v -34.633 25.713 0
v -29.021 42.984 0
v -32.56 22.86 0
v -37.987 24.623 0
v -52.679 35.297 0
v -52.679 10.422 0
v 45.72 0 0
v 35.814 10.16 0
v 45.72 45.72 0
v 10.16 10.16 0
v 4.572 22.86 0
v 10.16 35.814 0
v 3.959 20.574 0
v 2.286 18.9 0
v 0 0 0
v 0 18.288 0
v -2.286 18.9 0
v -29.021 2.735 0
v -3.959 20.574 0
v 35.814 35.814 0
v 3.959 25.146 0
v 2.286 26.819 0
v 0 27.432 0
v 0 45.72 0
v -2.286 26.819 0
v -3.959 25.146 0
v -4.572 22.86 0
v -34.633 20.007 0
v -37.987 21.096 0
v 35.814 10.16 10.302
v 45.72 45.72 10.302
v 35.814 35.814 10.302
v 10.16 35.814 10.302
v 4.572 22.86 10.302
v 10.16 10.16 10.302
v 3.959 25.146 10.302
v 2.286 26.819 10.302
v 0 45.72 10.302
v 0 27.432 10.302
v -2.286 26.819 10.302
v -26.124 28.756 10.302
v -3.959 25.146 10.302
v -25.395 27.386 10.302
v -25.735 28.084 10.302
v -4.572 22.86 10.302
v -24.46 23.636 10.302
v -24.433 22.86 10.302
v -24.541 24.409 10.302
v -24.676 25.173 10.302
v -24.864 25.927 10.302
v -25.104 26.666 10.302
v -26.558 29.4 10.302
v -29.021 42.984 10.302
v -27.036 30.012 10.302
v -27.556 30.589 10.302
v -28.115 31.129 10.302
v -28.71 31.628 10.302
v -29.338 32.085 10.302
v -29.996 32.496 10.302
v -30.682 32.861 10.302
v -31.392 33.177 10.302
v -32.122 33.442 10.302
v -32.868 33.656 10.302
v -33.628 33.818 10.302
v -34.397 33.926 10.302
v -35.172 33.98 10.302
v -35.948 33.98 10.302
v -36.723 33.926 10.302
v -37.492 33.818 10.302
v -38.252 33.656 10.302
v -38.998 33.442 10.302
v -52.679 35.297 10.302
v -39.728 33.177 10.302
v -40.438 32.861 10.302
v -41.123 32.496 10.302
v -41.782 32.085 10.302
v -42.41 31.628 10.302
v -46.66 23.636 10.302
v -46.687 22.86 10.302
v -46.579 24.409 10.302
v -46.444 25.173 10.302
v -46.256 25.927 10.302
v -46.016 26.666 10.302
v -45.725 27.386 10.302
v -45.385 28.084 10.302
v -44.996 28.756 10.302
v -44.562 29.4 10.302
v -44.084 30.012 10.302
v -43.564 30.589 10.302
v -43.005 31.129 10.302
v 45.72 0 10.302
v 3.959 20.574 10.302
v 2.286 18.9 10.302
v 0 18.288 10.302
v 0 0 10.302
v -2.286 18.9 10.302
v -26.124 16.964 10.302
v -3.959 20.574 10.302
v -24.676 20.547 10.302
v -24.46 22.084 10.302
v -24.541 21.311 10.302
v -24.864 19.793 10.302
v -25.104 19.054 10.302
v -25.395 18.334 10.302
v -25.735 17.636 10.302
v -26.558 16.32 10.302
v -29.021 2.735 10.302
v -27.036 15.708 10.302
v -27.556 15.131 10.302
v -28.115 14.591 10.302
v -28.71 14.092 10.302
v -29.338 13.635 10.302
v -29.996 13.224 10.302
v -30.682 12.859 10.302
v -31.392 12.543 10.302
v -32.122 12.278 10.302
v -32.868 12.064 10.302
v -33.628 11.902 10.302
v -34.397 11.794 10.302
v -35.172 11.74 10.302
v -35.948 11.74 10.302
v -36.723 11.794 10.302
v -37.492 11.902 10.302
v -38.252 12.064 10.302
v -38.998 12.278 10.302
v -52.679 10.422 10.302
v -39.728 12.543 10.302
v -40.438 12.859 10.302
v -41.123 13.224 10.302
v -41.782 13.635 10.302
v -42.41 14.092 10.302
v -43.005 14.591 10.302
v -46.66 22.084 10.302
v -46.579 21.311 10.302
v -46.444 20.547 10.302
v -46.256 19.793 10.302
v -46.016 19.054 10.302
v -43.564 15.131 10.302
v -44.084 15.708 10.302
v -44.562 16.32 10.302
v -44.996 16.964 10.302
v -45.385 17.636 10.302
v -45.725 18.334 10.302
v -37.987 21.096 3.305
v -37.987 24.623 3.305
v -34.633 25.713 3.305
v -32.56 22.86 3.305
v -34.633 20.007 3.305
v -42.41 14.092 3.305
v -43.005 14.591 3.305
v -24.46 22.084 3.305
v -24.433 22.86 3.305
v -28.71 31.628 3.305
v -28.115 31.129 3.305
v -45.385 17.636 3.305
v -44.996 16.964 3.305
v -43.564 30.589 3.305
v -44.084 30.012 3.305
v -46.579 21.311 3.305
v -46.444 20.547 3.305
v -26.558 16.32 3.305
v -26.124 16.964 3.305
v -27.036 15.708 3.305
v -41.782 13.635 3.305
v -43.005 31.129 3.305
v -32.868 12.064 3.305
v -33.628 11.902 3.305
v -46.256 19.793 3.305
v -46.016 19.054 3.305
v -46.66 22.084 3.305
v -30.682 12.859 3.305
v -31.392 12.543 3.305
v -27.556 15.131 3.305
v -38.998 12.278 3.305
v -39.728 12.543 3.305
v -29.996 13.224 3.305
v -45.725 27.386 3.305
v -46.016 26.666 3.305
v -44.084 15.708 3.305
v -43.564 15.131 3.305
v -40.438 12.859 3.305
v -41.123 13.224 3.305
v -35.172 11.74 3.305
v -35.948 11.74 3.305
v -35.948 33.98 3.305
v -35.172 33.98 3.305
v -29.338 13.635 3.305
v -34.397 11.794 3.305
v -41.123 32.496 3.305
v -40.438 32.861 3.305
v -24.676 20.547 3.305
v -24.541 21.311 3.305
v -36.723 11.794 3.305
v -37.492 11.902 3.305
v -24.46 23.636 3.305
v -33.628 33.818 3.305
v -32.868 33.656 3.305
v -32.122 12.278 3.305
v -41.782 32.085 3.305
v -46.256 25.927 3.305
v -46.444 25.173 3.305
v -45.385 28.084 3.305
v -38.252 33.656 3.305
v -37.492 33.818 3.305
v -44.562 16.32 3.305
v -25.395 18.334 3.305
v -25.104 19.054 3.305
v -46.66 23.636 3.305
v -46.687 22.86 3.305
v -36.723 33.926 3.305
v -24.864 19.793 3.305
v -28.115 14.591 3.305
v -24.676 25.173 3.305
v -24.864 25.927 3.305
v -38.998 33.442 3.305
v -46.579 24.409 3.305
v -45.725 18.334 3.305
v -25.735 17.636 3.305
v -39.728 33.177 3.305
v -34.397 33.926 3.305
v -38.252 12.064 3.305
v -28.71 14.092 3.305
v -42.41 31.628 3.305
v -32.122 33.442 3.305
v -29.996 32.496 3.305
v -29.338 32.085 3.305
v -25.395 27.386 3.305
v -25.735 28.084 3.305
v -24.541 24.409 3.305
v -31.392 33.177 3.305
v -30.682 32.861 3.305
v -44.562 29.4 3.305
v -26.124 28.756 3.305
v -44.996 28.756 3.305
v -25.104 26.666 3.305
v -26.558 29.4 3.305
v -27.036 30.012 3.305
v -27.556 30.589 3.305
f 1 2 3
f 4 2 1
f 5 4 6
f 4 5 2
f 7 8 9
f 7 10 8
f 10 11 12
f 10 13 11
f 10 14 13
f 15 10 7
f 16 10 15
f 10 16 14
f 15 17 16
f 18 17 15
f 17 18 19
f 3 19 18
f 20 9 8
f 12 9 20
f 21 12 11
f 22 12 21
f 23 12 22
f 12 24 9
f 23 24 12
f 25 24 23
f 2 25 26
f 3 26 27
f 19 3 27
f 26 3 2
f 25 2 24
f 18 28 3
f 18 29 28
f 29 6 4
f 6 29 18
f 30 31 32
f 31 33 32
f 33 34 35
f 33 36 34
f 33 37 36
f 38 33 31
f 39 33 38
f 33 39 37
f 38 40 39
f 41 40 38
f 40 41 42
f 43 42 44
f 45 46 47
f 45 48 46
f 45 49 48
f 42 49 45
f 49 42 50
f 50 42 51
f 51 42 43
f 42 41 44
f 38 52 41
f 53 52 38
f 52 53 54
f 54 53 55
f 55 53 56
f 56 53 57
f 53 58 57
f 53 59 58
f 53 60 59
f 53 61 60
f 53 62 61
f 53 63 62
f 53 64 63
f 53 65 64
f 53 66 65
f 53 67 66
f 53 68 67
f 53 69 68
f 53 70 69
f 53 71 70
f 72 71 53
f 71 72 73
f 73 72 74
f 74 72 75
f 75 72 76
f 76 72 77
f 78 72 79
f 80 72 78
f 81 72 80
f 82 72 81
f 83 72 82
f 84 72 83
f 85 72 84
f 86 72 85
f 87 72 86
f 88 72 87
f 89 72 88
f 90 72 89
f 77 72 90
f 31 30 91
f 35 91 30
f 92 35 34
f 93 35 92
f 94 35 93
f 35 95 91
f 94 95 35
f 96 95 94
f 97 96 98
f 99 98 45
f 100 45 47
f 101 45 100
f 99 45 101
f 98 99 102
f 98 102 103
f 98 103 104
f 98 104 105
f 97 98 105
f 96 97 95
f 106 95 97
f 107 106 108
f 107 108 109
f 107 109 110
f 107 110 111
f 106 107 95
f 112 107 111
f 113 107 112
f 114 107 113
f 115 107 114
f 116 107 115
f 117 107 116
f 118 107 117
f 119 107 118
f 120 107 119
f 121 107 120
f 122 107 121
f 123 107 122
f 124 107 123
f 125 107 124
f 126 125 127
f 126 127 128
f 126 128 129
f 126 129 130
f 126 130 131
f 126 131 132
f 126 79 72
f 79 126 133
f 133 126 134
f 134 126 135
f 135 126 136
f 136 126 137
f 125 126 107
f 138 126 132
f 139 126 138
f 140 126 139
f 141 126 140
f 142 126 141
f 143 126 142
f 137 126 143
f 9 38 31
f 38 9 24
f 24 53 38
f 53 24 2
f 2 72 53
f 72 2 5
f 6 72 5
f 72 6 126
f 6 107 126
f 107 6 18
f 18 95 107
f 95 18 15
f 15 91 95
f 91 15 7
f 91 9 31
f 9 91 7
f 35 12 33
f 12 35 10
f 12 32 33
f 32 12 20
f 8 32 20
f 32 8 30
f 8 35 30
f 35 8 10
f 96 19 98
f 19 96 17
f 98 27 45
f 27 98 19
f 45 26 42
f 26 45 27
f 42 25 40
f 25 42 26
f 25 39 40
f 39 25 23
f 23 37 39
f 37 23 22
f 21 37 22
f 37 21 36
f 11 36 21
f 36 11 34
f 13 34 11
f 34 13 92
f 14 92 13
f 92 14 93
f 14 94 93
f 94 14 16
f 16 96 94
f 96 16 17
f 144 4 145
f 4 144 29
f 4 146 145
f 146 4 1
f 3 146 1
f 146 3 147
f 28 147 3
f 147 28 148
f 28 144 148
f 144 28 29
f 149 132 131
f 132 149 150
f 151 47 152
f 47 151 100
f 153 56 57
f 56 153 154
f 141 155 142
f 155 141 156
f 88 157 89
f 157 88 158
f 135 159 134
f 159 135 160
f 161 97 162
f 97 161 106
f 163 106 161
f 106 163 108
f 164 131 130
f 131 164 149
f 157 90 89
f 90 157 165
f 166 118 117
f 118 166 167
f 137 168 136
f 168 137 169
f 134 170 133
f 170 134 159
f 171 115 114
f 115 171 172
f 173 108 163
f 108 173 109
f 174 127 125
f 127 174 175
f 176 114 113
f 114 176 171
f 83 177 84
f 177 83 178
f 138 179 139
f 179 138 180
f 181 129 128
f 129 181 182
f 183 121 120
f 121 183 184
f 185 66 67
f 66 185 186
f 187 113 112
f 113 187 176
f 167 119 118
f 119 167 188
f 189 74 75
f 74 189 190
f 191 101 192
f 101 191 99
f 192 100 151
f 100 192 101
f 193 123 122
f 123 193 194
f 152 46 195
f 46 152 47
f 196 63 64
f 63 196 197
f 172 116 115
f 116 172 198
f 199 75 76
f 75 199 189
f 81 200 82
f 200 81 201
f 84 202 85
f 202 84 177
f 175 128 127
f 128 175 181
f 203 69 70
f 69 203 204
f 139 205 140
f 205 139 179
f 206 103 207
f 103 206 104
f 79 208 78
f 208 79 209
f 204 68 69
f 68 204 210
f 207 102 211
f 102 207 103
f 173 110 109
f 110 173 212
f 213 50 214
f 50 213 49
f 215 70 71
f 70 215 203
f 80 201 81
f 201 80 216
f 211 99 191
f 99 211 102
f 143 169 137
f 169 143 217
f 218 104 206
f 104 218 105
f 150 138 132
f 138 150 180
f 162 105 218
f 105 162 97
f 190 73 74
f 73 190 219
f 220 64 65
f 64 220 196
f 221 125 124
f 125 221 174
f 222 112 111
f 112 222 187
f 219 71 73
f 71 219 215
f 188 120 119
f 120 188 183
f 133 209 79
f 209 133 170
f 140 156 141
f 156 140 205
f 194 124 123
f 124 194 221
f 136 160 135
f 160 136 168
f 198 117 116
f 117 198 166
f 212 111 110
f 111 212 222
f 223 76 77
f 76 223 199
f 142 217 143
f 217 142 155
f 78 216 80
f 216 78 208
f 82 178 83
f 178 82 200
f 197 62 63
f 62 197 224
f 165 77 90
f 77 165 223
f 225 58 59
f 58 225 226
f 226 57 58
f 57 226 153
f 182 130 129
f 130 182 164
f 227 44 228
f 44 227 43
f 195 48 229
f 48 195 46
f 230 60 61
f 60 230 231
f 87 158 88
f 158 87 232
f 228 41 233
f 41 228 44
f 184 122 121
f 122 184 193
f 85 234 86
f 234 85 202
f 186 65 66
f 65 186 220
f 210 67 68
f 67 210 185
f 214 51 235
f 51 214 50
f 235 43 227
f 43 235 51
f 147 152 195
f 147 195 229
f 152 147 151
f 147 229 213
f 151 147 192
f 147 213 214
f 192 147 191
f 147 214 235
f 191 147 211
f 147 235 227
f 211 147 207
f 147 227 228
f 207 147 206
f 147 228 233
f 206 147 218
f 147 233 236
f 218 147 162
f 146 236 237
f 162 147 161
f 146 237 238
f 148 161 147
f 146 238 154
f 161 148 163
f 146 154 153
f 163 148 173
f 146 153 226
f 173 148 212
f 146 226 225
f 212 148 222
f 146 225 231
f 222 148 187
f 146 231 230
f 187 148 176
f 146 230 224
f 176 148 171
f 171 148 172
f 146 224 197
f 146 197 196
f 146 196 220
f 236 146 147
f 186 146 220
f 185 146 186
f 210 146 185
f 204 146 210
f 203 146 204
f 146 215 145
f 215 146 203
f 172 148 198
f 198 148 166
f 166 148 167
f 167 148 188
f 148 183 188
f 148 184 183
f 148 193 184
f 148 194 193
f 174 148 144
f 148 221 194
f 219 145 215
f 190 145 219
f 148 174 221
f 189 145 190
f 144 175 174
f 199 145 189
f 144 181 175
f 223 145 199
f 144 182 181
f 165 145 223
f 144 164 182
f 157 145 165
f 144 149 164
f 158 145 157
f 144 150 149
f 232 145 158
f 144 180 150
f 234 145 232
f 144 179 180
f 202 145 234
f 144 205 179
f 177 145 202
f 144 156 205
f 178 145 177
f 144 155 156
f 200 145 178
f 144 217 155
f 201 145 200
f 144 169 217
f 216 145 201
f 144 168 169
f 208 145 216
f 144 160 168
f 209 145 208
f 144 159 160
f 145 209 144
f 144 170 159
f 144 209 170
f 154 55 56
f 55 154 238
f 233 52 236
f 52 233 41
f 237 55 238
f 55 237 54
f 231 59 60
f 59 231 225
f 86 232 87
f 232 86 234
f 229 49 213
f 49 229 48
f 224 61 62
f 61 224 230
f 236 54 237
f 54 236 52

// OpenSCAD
// file: ../../Meta/Resolution.scad
// Constants
RESOLUTION_LOW = 0;
RESOLUTION_HIGH = 1;

// Setting
RESOLUTION = RESOLUTION_HIGH;

// Utility functions
function ResolutionIsLow() = RESOLUTION == RESOLUTION_LOW;
function ResolutionIsHigh() = RESOLUTION == RESOLUTION_HIGH;
function Resolution(low, high) = ResolutionIsLow() ? low : high;
function ResolutionFs() = Resolution(1, 0.25);
function ResolutionFa() = Resolution(10, 4);
// file: ../../Meta/Units.scad
Millimeters = 1;
Inches = 2;

DEFAULT_UNITS = Inches;

function Units() = DEFAULT_UNITS;
function UnitsFs() = Units() == Millimeters ? 2 : 2/25.4;

function InchesToMillimeters(n) = n * 25.4;
function MillimetersToInches(n) = n / 25.4;

function Millimeters(n, units=Units())   = units == Millimeters   ? n : MillimetersToInches(n);
function Inches(n, units=Units()) = units == Inches ? n : InchesToMillimeters(n);
function UnitSelect(value, units) = units == Millimeters ? Millimeters(value) : Inches(value);
function UnitType(type) = type == "Millimeters" ? Millimeters : Inches;

module ScaleToMillimeters() {
  if (Units() == Inches) {
    scale(25.4)
    children();
  } else {
    children();
  }
}
// file: ../../Vitamins/Bearing.scad
use <../Meta/Units.scad>;
use <../Meta/Resolution.scad>;


// *********
// * Setup *
// *********
$fa = ResolutionFa();
$fs = UnitsFs()*ResolutionFs();

// *************
// * Constants *
// *************
BearingInnerDiameter     = 1;
BearingOuterDiameter     = 2;
BearingWidth             = 3;
BearingRaceDiameter      = 4;

// *************
// * Accessors *
// *************
function BearingClearanceSnug()  = Inches(0.01);
function BearingClearanceLoose() = Inches(0.02);

function BearingInnerDiameter(spec, clearance) = lookup(BearingInnerDiameter, spec) + clearance;
function BearingInnerRadius(spec, clearance)   = BearingInnerDiameter(spec, clearance)/2;

function BearingOuterDiameter(spec, clearance) = lookup(BearingOuterDiameter, spec) + clearance;
function BearingOuterRadius(spec, clearance)   = BearingOuterDiameter(spec, clearance)/2;

function BearingRaceDiameter(spec)             = lookup(BearingRaceDiameter, spec)/2;
function BearingRaceRadius(spec)               = BearingRaceDiameter(spec)/2;

function BearingWidth(spec)                    = lookup(BearingWidth, spec);

// *********
// * Specs *
// *********

// 608 Bearing
function Spec_Bearing608() = [
  [BearingInnerDiameter,    Millimeters(8)],
  [BearingOuterDiameter,    Millimeters(22)],
  [BearingWidth,            Millimeters(7)],
  [BearingRaceDiameter,     Millimeters(12)],
];

// 623 Bearing
function Spec_Bearing623() = [
  [BearingInnerDiameter,    Millimeters(3)],
  [BearingOuterDiameter,    Millimeters(10)],
  [BearingWidth,            Millimeters(8)],
  [BearingRaceDiameter,     Millimeters(5.2)],
];

// ***********
// * Modules *
// ***********
module Bearing2D(spec=Spec_Bearing608(), clearance=0, solid=false) {
  difference() {
    circle(r=BearingOuterRadius(spec, clearance));

    if (solid==false)
    circle(r=BearingInnerRadius(spec, clearance));
  }
}

module Bearing(spec=Spec_Bearing608(),
               clearance=0,
               extraHeight=0,
               solid=false, center=false) {
  color("SteelBlue")
  render()
  linear_extrude(height=BearingWidth(spec)+extraHeight, center=center)
  Bearing2D(spec=spec, clearance=clearance, solid=solid);
}

scale([25.4, 25.4, 25.4])
Bearing(spec=Spec_Bearing608());
// file: ../../Vitamins/Square Tube.scad
//
// Square Tube dimensions
//
SquareTubeInner           = 1;
SquareTubeOuter           = 2;
SquareTubeCornerRadius    = 3;
SquareTubeClearanceLoose  = 4; // Added to width, should slide freely
SquareTubeClearanceSnug   = 5; // Added to width, should not slip (default)
SquareTubeWeightPerUnit   = 6;

function SquareTubeClearanceSnug()  = SquareTubeClearanceSnug;
function SquareTubeClearanceLoose() = SquareTubeClearanceLoose;

function SquareTubeClearance(spec, clearance) = (clearance != undef) ? lookup(clearance, spec) : 0;
function SquareTubeInner(spec, clearance)     = lookup(SquareTubeInner, spec) + SquareTubeClearance(spec, clearance);
function SquareTubeOuter(spec, clearance)     = lookup(SquareTubeOuter, spec) + SquareTubeClearance(spec, clearance);
function SquareTubeCornerRadius(spec)         = lookup(SquareTubeCornerRadius, spec);
function SquareTubeWall(spec)                 = (SquareTubeOuter(spec) - SquareTubeInner(spec))/2;


// 1" Square Tube
SquareTubeOneInch = [
  [SquareTubeInner,          0.87],
  [SquareTubeOuter,          1],
  [SquareTubeCornerRadius,   0.11],
  [SquareTubeClearanceLoose, 0.015], // TODO: Verify
  [SquareTubeClearanceSnug,  0.01], // TODO: Verify
  [SquareTubeWeightPerUnit,  0] // TODO
];
function Spec_SquareTubeOneInch() = SquareTubeOneInch;

module Tubing2D(spec=Spec_SquareTubeOneInch(),
                clearance=undef,
                hollow=false) {
  union() {
    difference() {
      square([SquareTubeOuter(spec, clearance), SquareTubeOuter(spec, clearance)]);

      if (hollow==true)
      translate([SquareTubeWall(spec),SquareTubeWall(spec),0])
      square([SquareTubeInner(spec), SquareTubeInner(spec)]);
    }

    // Corner chamfers
    for (i=[[SquareTubeWall(spec),SquareTubeWall(spec),0],
            [SquareTubeInner(spec)+SquareTubeWall(spec),SquareTubeWall(spec),90],
            [SquareTubeInner(spec)+SquareTubeWall(spec),SquareTubeInner(spec)+SquareTubeWall(spec),180],
            [SquareTubeWall(spec),SquareTubeInner(spec)+SquareTubeWall(spec),-90]]) {
      translate([i[0],i[1]])
      rotate([0,0,i[2]])
      polygon([[0,0], [SquareTubeCornerRadius(spec),0], [0, SquareTubeCornerRadius(spec)]]);
    }
  }
}


Tubing2D(spec=Spec_SquareTubeOneInch(), hollow=true);

module TubingInsert2D(spec=Spec_SquareTubeOneInch()) {
  difference() {
    square([tubingInner,tubingInner]);

    // Corner chamfers
    for (i=[[0,0,0],
             [tubingInner,0,90],
             [tubingInner,tubingInner,180],
             [0,tubingInner,-90]]) {
      translate([i[0],i[1]])
      rotate([0,0,i[2]])
      polygon([[0,0], [SquareTubeCornerRadius(spec),0], [0, SquareTubeCornerRadius(spec)]]);
    }
  }
}

//TubingInsert2D();
// main file
use <../../Vitamins/Square Tube.scad>;
use <../../Vitamins/Bearing.scad>;

module TubularBearings2D(tube=Spec_SquareTubeOneInch(), tubeClearance=SquareTubeClearanceSnug(),
                         bearing=Spec_Bearing608(), bearingOffset=1.4,
                         pivot=0.18,
                         backHeight=0.13, wall=0.4) {

  bearingOffsetY = wall+(SquareTubeOuter(tube)/2);
  difference() {
    hull() {
      square([SquareTubeOuter(tube)+(wall*2), SquareTubeOuter(tube)+(wall*2)]);

      *translate([(SquareTubeOuter(tube)/2)+(wall*1.5),(SquareTubeOuter(tube)/2) + wall,0])
      circle(r=(SquareTubeOuter(tube)/2)+(wall*1.5), $fn=20);

      translate([-bearingOffset,bearingOffsetY])
      circle(r=BearingOuterRadius(bearing, clearance=0)+wall);
    }

    // Bolt holes
    for (i = [bearingOffsetY])
    translate([0,i])
    circle(r=0.18, $fn=12);

    // Bearing race hole
    translate([-bearingOffset,bearingOffsetY])
    circle(r=BearingRaceRadius(bearing));

    // Tubing hole
    translate([wall,wall])
    Tubing2D(hollow=false, clearance=tubeClearance, spec=tube);
  }
}

module TubularBearingsBack(tube=Spec_SquareTubeOneInch(), bearing=Spec_Bearing608(),
                       backHeight=0.13, bearingOffset=1.4, wall=0.4) {

  bearingOffsetY = wall+(SquareTubeOuter(tube)/2);
  difference() {
    linear_extrude(height=BearingWidth(bearing)+backHeight)
    TubularBearings2D();

    translate([-bearingOffset,bearingOffsetY,backHeight+0.0001])
    Bearing(spec=Spec_Bearing608(), clearance=BearingClearanceSnug(), solid=true);
  }
}

module TubularBearingsFront(tube=Spec_SquareTubeOneInch(), bearing=Spec_Bearing608(),
                            bearingOffset=1.4, wall=0.4) {

  linear_extrude(height=0.5)
  TubularBearings2D();
}

scale([25.4, 25.4, 25.4]) {
  TubularBearingsBack();

  translate([0,0,0.5])
  *TubularBearingsFront();
}
